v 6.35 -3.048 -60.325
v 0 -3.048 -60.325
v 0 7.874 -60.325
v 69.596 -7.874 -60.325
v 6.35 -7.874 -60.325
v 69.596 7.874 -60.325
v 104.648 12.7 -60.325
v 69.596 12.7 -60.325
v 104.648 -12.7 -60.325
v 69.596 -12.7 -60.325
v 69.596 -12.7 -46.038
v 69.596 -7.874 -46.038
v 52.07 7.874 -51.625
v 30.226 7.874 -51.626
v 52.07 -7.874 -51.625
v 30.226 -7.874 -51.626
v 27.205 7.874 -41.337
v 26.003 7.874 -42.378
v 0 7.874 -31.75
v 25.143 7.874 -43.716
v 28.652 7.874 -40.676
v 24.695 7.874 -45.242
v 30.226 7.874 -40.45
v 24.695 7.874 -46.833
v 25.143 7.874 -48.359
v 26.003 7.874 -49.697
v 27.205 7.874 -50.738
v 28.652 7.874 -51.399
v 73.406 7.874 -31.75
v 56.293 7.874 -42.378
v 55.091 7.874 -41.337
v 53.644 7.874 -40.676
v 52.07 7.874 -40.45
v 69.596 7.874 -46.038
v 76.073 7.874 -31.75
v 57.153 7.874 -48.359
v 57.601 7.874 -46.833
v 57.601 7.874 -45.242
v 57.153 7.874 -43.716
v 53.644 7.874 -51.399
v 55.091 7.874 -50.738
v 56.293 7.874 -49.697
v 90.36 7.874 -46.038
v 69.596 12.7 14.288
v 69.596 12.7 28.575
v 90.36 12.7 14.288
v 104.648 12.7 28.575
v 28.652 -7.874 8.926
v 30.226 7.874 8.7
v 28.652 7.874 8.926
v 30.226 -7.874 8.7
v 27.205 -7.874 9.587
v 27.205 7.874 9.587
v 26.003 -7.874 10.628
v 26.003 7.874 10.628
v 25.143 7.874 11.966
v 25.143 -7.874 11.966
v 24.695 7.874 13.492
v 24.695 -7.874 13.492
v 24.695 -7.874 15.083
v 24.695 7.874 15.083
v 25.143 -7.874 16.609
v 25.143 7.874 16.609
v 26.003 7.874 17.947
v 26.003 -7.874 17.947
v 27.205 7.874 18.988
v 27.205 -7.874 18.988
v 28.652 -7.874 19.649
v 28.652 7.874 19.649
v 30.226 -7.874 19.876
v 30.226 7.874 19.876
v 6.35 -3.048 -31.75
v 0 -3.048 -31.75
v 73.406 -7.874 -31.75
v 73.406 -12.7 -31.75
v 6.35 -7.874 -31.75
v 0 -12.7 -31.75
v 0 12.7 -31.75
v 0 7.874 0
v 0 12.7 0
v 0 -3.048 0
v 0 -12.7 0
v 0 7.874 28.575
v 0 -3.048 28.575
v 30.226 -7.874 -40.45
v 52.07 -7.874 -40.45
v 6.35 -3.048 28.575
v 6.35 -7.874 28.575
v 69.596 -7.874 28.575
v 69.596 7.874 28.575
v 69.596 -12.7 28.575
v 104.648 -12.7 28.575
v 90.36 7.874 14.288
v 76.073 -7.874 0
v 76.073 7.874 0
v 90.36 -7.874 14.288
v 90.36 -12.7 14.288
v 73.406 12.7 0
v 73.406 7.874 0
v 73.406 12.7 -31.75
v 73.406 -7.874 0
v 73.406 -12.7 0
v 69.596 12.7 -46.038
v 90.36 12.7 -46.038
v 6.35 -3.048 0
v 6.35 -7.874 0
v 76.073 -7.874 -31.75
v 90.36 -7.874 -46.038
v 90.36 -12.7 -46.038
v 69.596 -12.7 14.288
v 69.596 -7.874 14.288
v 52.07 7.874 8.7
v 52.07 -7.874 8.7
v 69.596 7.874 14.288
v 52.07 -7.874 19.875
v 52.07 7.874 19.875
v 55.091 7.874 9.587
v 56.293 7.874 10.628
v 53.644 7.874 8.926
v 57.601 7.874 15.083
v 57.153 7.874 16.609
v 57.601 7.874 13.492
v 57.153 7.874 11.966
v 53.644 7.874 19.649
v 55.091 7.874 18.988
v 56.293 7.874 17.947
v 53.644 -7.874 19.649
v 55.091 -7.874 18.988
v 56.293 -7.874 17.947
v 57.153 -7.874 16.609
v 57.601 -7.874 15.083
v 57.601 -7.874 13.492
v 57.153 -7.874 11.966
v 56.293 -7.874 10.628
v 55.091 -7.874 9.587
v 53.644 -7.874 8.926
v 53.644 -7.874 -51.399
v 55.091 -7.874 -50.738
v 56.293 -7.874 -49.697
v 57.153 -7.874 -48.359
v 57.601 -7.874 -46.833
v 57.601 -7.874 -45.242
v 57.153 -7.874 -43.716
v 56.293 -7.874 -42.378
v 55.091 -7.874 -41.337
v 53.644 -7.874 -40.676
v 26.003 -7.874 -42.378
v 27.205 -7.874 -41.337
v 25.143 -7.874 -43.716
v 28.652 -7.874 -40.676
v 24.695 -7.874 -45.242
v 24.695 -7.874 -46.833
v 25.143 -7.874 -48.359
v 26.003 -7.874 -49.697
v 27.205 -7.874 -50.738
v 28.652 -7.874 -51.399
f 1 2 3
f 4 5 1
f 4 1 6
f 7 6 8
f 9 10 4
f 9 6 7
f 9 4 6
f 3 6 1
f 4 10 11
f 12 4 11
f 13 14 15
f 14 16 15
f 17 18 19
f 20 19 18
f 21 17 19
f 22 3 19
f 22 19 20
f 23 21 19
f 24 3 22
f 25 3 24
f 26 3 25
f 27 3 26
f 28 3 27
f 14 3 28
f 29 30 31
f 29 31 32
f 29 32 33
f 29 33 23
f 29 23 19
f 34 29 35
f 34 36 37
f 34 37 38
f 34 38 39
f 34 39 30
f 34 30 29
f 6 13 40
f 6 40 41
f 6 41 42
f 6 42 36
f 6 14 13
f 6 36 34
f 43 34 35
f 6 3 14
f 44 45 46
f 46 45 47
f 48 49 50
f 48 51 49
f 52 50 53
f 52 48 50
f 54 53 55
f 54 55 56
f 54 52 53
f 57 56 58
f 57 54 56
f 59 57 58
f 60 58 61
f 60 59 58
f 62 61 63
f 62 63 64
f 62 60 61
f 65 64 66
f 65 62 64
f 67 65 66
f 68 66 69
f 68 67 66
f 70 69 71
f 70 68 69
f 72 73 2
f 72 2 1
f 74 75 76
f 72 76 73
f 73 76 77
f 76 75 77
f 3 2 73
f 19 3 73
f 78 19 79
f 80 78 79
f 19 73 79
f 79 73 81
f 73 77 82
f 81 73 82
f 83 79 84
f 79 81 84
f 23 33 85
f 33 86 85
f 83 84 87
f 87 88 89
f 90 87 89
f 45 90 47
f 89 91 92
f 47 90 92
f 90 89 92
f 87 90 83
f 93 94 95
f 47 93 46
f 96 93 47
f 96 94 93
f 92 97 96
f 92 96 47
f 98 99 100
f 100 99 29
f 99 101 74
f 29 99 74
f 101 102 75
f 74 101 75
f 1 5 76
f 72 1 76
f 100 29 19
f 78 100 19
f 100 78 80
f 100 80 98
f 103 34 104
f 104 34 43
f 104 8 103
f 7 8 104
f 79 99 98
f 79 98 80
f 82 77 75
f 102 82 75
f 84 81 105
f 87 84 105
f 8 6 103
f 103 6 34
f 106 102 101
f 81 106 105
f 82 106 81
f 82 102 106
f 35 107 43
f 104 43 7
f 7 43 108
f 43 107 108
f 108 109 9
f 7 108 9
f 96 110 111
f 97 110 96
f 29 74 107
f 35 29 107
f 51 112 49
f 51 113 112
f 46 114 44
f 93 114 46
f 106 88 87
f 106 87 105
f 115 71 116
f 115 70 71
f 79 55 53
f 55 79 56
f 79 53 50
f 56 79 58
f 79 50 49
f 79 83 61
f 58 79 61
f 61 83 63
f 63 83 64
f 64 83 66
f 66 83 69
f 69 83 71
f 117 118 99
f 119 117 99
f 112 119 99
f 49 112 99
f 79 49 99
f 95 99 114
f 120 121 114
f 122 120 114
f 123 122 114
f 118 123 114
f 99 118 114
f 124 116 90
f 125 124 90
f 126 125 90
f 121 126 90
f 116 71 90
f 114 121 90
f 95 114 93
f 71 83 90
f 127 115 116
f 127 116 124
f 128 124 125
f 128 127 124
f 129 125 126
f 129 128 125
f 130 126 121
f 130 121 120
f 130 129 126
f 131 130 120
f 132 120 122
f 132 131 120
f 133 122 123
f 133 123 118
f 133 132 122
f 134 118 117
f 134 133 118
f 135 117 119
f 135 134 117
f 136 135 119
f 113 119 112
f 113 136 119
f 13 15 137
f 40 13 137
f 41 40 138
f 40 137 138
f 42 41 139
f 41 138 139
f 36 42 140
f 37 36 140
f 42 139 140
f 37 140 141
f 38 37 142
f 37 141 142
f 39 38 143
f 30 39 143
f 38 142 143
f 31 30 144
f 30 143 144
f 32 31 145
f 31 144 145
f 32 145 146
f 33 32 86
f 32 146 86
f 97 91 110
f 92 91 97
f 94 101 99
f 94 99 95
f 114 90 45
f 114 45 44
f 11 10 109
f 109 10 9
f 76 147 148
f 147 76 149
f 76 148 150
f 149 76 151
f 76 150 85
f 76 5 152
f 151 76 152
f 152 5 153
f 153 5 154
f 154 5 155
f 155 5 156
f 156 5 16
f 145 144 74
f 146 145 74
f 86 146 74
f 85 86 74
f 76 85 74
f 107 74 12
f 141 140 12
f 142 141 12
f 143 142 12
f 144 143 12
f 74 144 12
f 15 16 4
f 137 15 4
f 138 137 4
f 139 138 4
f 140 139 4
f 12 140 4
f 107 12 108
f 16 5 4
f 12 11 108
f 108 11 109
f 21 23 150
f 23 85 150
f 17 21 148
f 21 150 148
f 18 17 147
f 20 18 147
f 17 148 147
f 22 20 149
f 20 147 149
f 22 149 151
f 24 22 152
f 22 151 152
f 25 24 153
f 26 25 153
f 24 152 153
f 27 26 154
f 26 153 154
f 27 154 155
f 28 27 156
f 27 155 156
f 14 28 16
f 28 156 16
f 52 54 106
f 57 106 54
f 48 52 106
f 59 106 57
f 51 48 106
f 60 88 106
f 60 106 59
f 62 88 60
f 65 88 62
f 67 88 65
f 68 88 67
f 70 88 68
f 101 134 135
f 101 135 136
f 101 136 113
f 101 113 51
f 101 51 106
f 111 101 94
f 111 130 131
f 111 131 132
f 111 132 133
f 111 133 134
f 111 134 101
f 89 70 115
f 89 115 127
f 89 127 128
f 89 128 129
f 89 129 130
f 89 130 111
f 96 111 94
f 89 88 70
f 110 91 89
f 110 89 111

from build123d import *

# Parameters (mm, degrees)
F1_DEPTH      = 12.7
F2_DEPTH      = 7.874
F0_W          = 6.35
F0_H          = 28.575
F3_DEPTH      = 3.048
F3_DEPTH_BACK = 7.874
F4_DEPTH      = 12.7


with BuildPart() as f1:
    # F0 (on Front) → F1 (new body, symmetric)
    with BuildSketch(Plane.XZ):
        Polygon((69.596, 14.2875), (90.3605, 14.2875), (104.648, 28.575), (69.596, 28.575), align=None)
    extrude(amount=F1_DEPTH, both=True)

    # F0 (on Front) → F2 (join, symmetric)
    with BuildSketch(Plane.XZ):
        Polygon((73.406, 0), (76.073, 0), (90.3605, 14.2875), (69.596, 14.2875), (69.596, 28.575), (6.35, 28.575), (6.35, 0), align=None)
        with BuildLine():
            ThreePointArc((52.07, 19.8755), (57.658, 14.2875), (52.07, 8.6995))
            Line((52.07, 8.6995), (30.226, 8.6995))
            ThreePointArc((30.226, 8.6995), (24.638, 14.2875), (30.226, 19.8755))
            Line((30.226, 19.8755), (52.07, 19.8755))
        make_face(mode=Mode.SUBTRACT)
    extrude(amount=F2_DEPTH, both=True)

    # F0 (on Front) → F3 (join, two sides)
    with BuildSketch(Plane.XZ) as f3_sk:
        with Locations((3.175, 14.2875)):
            Rectangle(F0_W, F0_H)
    extrude(amount=F3_DEPTH)
    extrude(f3_sk.sketch, amount=-F3_DEPTH_BACK)

    # F0 (on Front) → F4 (join, symmetric)
    with BuildSketch(Plane.XZ):
        Polygon((73.406, -15.875), (73.406, 0), (6.35, 0), (0, 0), (0, -15.875), align=None)
    extrude(amount=F4_DEPTH, both=True)

    # F5: F1 across face


with BuildPart() as f1_1:
    add(f1.part)
    add(f1.part.mirror(Plane(origin=(36.703, 0, -15.875), x_dir=(1, 0, 0), z_dir=(0, 0, -1))))


solid = f1_1.part
